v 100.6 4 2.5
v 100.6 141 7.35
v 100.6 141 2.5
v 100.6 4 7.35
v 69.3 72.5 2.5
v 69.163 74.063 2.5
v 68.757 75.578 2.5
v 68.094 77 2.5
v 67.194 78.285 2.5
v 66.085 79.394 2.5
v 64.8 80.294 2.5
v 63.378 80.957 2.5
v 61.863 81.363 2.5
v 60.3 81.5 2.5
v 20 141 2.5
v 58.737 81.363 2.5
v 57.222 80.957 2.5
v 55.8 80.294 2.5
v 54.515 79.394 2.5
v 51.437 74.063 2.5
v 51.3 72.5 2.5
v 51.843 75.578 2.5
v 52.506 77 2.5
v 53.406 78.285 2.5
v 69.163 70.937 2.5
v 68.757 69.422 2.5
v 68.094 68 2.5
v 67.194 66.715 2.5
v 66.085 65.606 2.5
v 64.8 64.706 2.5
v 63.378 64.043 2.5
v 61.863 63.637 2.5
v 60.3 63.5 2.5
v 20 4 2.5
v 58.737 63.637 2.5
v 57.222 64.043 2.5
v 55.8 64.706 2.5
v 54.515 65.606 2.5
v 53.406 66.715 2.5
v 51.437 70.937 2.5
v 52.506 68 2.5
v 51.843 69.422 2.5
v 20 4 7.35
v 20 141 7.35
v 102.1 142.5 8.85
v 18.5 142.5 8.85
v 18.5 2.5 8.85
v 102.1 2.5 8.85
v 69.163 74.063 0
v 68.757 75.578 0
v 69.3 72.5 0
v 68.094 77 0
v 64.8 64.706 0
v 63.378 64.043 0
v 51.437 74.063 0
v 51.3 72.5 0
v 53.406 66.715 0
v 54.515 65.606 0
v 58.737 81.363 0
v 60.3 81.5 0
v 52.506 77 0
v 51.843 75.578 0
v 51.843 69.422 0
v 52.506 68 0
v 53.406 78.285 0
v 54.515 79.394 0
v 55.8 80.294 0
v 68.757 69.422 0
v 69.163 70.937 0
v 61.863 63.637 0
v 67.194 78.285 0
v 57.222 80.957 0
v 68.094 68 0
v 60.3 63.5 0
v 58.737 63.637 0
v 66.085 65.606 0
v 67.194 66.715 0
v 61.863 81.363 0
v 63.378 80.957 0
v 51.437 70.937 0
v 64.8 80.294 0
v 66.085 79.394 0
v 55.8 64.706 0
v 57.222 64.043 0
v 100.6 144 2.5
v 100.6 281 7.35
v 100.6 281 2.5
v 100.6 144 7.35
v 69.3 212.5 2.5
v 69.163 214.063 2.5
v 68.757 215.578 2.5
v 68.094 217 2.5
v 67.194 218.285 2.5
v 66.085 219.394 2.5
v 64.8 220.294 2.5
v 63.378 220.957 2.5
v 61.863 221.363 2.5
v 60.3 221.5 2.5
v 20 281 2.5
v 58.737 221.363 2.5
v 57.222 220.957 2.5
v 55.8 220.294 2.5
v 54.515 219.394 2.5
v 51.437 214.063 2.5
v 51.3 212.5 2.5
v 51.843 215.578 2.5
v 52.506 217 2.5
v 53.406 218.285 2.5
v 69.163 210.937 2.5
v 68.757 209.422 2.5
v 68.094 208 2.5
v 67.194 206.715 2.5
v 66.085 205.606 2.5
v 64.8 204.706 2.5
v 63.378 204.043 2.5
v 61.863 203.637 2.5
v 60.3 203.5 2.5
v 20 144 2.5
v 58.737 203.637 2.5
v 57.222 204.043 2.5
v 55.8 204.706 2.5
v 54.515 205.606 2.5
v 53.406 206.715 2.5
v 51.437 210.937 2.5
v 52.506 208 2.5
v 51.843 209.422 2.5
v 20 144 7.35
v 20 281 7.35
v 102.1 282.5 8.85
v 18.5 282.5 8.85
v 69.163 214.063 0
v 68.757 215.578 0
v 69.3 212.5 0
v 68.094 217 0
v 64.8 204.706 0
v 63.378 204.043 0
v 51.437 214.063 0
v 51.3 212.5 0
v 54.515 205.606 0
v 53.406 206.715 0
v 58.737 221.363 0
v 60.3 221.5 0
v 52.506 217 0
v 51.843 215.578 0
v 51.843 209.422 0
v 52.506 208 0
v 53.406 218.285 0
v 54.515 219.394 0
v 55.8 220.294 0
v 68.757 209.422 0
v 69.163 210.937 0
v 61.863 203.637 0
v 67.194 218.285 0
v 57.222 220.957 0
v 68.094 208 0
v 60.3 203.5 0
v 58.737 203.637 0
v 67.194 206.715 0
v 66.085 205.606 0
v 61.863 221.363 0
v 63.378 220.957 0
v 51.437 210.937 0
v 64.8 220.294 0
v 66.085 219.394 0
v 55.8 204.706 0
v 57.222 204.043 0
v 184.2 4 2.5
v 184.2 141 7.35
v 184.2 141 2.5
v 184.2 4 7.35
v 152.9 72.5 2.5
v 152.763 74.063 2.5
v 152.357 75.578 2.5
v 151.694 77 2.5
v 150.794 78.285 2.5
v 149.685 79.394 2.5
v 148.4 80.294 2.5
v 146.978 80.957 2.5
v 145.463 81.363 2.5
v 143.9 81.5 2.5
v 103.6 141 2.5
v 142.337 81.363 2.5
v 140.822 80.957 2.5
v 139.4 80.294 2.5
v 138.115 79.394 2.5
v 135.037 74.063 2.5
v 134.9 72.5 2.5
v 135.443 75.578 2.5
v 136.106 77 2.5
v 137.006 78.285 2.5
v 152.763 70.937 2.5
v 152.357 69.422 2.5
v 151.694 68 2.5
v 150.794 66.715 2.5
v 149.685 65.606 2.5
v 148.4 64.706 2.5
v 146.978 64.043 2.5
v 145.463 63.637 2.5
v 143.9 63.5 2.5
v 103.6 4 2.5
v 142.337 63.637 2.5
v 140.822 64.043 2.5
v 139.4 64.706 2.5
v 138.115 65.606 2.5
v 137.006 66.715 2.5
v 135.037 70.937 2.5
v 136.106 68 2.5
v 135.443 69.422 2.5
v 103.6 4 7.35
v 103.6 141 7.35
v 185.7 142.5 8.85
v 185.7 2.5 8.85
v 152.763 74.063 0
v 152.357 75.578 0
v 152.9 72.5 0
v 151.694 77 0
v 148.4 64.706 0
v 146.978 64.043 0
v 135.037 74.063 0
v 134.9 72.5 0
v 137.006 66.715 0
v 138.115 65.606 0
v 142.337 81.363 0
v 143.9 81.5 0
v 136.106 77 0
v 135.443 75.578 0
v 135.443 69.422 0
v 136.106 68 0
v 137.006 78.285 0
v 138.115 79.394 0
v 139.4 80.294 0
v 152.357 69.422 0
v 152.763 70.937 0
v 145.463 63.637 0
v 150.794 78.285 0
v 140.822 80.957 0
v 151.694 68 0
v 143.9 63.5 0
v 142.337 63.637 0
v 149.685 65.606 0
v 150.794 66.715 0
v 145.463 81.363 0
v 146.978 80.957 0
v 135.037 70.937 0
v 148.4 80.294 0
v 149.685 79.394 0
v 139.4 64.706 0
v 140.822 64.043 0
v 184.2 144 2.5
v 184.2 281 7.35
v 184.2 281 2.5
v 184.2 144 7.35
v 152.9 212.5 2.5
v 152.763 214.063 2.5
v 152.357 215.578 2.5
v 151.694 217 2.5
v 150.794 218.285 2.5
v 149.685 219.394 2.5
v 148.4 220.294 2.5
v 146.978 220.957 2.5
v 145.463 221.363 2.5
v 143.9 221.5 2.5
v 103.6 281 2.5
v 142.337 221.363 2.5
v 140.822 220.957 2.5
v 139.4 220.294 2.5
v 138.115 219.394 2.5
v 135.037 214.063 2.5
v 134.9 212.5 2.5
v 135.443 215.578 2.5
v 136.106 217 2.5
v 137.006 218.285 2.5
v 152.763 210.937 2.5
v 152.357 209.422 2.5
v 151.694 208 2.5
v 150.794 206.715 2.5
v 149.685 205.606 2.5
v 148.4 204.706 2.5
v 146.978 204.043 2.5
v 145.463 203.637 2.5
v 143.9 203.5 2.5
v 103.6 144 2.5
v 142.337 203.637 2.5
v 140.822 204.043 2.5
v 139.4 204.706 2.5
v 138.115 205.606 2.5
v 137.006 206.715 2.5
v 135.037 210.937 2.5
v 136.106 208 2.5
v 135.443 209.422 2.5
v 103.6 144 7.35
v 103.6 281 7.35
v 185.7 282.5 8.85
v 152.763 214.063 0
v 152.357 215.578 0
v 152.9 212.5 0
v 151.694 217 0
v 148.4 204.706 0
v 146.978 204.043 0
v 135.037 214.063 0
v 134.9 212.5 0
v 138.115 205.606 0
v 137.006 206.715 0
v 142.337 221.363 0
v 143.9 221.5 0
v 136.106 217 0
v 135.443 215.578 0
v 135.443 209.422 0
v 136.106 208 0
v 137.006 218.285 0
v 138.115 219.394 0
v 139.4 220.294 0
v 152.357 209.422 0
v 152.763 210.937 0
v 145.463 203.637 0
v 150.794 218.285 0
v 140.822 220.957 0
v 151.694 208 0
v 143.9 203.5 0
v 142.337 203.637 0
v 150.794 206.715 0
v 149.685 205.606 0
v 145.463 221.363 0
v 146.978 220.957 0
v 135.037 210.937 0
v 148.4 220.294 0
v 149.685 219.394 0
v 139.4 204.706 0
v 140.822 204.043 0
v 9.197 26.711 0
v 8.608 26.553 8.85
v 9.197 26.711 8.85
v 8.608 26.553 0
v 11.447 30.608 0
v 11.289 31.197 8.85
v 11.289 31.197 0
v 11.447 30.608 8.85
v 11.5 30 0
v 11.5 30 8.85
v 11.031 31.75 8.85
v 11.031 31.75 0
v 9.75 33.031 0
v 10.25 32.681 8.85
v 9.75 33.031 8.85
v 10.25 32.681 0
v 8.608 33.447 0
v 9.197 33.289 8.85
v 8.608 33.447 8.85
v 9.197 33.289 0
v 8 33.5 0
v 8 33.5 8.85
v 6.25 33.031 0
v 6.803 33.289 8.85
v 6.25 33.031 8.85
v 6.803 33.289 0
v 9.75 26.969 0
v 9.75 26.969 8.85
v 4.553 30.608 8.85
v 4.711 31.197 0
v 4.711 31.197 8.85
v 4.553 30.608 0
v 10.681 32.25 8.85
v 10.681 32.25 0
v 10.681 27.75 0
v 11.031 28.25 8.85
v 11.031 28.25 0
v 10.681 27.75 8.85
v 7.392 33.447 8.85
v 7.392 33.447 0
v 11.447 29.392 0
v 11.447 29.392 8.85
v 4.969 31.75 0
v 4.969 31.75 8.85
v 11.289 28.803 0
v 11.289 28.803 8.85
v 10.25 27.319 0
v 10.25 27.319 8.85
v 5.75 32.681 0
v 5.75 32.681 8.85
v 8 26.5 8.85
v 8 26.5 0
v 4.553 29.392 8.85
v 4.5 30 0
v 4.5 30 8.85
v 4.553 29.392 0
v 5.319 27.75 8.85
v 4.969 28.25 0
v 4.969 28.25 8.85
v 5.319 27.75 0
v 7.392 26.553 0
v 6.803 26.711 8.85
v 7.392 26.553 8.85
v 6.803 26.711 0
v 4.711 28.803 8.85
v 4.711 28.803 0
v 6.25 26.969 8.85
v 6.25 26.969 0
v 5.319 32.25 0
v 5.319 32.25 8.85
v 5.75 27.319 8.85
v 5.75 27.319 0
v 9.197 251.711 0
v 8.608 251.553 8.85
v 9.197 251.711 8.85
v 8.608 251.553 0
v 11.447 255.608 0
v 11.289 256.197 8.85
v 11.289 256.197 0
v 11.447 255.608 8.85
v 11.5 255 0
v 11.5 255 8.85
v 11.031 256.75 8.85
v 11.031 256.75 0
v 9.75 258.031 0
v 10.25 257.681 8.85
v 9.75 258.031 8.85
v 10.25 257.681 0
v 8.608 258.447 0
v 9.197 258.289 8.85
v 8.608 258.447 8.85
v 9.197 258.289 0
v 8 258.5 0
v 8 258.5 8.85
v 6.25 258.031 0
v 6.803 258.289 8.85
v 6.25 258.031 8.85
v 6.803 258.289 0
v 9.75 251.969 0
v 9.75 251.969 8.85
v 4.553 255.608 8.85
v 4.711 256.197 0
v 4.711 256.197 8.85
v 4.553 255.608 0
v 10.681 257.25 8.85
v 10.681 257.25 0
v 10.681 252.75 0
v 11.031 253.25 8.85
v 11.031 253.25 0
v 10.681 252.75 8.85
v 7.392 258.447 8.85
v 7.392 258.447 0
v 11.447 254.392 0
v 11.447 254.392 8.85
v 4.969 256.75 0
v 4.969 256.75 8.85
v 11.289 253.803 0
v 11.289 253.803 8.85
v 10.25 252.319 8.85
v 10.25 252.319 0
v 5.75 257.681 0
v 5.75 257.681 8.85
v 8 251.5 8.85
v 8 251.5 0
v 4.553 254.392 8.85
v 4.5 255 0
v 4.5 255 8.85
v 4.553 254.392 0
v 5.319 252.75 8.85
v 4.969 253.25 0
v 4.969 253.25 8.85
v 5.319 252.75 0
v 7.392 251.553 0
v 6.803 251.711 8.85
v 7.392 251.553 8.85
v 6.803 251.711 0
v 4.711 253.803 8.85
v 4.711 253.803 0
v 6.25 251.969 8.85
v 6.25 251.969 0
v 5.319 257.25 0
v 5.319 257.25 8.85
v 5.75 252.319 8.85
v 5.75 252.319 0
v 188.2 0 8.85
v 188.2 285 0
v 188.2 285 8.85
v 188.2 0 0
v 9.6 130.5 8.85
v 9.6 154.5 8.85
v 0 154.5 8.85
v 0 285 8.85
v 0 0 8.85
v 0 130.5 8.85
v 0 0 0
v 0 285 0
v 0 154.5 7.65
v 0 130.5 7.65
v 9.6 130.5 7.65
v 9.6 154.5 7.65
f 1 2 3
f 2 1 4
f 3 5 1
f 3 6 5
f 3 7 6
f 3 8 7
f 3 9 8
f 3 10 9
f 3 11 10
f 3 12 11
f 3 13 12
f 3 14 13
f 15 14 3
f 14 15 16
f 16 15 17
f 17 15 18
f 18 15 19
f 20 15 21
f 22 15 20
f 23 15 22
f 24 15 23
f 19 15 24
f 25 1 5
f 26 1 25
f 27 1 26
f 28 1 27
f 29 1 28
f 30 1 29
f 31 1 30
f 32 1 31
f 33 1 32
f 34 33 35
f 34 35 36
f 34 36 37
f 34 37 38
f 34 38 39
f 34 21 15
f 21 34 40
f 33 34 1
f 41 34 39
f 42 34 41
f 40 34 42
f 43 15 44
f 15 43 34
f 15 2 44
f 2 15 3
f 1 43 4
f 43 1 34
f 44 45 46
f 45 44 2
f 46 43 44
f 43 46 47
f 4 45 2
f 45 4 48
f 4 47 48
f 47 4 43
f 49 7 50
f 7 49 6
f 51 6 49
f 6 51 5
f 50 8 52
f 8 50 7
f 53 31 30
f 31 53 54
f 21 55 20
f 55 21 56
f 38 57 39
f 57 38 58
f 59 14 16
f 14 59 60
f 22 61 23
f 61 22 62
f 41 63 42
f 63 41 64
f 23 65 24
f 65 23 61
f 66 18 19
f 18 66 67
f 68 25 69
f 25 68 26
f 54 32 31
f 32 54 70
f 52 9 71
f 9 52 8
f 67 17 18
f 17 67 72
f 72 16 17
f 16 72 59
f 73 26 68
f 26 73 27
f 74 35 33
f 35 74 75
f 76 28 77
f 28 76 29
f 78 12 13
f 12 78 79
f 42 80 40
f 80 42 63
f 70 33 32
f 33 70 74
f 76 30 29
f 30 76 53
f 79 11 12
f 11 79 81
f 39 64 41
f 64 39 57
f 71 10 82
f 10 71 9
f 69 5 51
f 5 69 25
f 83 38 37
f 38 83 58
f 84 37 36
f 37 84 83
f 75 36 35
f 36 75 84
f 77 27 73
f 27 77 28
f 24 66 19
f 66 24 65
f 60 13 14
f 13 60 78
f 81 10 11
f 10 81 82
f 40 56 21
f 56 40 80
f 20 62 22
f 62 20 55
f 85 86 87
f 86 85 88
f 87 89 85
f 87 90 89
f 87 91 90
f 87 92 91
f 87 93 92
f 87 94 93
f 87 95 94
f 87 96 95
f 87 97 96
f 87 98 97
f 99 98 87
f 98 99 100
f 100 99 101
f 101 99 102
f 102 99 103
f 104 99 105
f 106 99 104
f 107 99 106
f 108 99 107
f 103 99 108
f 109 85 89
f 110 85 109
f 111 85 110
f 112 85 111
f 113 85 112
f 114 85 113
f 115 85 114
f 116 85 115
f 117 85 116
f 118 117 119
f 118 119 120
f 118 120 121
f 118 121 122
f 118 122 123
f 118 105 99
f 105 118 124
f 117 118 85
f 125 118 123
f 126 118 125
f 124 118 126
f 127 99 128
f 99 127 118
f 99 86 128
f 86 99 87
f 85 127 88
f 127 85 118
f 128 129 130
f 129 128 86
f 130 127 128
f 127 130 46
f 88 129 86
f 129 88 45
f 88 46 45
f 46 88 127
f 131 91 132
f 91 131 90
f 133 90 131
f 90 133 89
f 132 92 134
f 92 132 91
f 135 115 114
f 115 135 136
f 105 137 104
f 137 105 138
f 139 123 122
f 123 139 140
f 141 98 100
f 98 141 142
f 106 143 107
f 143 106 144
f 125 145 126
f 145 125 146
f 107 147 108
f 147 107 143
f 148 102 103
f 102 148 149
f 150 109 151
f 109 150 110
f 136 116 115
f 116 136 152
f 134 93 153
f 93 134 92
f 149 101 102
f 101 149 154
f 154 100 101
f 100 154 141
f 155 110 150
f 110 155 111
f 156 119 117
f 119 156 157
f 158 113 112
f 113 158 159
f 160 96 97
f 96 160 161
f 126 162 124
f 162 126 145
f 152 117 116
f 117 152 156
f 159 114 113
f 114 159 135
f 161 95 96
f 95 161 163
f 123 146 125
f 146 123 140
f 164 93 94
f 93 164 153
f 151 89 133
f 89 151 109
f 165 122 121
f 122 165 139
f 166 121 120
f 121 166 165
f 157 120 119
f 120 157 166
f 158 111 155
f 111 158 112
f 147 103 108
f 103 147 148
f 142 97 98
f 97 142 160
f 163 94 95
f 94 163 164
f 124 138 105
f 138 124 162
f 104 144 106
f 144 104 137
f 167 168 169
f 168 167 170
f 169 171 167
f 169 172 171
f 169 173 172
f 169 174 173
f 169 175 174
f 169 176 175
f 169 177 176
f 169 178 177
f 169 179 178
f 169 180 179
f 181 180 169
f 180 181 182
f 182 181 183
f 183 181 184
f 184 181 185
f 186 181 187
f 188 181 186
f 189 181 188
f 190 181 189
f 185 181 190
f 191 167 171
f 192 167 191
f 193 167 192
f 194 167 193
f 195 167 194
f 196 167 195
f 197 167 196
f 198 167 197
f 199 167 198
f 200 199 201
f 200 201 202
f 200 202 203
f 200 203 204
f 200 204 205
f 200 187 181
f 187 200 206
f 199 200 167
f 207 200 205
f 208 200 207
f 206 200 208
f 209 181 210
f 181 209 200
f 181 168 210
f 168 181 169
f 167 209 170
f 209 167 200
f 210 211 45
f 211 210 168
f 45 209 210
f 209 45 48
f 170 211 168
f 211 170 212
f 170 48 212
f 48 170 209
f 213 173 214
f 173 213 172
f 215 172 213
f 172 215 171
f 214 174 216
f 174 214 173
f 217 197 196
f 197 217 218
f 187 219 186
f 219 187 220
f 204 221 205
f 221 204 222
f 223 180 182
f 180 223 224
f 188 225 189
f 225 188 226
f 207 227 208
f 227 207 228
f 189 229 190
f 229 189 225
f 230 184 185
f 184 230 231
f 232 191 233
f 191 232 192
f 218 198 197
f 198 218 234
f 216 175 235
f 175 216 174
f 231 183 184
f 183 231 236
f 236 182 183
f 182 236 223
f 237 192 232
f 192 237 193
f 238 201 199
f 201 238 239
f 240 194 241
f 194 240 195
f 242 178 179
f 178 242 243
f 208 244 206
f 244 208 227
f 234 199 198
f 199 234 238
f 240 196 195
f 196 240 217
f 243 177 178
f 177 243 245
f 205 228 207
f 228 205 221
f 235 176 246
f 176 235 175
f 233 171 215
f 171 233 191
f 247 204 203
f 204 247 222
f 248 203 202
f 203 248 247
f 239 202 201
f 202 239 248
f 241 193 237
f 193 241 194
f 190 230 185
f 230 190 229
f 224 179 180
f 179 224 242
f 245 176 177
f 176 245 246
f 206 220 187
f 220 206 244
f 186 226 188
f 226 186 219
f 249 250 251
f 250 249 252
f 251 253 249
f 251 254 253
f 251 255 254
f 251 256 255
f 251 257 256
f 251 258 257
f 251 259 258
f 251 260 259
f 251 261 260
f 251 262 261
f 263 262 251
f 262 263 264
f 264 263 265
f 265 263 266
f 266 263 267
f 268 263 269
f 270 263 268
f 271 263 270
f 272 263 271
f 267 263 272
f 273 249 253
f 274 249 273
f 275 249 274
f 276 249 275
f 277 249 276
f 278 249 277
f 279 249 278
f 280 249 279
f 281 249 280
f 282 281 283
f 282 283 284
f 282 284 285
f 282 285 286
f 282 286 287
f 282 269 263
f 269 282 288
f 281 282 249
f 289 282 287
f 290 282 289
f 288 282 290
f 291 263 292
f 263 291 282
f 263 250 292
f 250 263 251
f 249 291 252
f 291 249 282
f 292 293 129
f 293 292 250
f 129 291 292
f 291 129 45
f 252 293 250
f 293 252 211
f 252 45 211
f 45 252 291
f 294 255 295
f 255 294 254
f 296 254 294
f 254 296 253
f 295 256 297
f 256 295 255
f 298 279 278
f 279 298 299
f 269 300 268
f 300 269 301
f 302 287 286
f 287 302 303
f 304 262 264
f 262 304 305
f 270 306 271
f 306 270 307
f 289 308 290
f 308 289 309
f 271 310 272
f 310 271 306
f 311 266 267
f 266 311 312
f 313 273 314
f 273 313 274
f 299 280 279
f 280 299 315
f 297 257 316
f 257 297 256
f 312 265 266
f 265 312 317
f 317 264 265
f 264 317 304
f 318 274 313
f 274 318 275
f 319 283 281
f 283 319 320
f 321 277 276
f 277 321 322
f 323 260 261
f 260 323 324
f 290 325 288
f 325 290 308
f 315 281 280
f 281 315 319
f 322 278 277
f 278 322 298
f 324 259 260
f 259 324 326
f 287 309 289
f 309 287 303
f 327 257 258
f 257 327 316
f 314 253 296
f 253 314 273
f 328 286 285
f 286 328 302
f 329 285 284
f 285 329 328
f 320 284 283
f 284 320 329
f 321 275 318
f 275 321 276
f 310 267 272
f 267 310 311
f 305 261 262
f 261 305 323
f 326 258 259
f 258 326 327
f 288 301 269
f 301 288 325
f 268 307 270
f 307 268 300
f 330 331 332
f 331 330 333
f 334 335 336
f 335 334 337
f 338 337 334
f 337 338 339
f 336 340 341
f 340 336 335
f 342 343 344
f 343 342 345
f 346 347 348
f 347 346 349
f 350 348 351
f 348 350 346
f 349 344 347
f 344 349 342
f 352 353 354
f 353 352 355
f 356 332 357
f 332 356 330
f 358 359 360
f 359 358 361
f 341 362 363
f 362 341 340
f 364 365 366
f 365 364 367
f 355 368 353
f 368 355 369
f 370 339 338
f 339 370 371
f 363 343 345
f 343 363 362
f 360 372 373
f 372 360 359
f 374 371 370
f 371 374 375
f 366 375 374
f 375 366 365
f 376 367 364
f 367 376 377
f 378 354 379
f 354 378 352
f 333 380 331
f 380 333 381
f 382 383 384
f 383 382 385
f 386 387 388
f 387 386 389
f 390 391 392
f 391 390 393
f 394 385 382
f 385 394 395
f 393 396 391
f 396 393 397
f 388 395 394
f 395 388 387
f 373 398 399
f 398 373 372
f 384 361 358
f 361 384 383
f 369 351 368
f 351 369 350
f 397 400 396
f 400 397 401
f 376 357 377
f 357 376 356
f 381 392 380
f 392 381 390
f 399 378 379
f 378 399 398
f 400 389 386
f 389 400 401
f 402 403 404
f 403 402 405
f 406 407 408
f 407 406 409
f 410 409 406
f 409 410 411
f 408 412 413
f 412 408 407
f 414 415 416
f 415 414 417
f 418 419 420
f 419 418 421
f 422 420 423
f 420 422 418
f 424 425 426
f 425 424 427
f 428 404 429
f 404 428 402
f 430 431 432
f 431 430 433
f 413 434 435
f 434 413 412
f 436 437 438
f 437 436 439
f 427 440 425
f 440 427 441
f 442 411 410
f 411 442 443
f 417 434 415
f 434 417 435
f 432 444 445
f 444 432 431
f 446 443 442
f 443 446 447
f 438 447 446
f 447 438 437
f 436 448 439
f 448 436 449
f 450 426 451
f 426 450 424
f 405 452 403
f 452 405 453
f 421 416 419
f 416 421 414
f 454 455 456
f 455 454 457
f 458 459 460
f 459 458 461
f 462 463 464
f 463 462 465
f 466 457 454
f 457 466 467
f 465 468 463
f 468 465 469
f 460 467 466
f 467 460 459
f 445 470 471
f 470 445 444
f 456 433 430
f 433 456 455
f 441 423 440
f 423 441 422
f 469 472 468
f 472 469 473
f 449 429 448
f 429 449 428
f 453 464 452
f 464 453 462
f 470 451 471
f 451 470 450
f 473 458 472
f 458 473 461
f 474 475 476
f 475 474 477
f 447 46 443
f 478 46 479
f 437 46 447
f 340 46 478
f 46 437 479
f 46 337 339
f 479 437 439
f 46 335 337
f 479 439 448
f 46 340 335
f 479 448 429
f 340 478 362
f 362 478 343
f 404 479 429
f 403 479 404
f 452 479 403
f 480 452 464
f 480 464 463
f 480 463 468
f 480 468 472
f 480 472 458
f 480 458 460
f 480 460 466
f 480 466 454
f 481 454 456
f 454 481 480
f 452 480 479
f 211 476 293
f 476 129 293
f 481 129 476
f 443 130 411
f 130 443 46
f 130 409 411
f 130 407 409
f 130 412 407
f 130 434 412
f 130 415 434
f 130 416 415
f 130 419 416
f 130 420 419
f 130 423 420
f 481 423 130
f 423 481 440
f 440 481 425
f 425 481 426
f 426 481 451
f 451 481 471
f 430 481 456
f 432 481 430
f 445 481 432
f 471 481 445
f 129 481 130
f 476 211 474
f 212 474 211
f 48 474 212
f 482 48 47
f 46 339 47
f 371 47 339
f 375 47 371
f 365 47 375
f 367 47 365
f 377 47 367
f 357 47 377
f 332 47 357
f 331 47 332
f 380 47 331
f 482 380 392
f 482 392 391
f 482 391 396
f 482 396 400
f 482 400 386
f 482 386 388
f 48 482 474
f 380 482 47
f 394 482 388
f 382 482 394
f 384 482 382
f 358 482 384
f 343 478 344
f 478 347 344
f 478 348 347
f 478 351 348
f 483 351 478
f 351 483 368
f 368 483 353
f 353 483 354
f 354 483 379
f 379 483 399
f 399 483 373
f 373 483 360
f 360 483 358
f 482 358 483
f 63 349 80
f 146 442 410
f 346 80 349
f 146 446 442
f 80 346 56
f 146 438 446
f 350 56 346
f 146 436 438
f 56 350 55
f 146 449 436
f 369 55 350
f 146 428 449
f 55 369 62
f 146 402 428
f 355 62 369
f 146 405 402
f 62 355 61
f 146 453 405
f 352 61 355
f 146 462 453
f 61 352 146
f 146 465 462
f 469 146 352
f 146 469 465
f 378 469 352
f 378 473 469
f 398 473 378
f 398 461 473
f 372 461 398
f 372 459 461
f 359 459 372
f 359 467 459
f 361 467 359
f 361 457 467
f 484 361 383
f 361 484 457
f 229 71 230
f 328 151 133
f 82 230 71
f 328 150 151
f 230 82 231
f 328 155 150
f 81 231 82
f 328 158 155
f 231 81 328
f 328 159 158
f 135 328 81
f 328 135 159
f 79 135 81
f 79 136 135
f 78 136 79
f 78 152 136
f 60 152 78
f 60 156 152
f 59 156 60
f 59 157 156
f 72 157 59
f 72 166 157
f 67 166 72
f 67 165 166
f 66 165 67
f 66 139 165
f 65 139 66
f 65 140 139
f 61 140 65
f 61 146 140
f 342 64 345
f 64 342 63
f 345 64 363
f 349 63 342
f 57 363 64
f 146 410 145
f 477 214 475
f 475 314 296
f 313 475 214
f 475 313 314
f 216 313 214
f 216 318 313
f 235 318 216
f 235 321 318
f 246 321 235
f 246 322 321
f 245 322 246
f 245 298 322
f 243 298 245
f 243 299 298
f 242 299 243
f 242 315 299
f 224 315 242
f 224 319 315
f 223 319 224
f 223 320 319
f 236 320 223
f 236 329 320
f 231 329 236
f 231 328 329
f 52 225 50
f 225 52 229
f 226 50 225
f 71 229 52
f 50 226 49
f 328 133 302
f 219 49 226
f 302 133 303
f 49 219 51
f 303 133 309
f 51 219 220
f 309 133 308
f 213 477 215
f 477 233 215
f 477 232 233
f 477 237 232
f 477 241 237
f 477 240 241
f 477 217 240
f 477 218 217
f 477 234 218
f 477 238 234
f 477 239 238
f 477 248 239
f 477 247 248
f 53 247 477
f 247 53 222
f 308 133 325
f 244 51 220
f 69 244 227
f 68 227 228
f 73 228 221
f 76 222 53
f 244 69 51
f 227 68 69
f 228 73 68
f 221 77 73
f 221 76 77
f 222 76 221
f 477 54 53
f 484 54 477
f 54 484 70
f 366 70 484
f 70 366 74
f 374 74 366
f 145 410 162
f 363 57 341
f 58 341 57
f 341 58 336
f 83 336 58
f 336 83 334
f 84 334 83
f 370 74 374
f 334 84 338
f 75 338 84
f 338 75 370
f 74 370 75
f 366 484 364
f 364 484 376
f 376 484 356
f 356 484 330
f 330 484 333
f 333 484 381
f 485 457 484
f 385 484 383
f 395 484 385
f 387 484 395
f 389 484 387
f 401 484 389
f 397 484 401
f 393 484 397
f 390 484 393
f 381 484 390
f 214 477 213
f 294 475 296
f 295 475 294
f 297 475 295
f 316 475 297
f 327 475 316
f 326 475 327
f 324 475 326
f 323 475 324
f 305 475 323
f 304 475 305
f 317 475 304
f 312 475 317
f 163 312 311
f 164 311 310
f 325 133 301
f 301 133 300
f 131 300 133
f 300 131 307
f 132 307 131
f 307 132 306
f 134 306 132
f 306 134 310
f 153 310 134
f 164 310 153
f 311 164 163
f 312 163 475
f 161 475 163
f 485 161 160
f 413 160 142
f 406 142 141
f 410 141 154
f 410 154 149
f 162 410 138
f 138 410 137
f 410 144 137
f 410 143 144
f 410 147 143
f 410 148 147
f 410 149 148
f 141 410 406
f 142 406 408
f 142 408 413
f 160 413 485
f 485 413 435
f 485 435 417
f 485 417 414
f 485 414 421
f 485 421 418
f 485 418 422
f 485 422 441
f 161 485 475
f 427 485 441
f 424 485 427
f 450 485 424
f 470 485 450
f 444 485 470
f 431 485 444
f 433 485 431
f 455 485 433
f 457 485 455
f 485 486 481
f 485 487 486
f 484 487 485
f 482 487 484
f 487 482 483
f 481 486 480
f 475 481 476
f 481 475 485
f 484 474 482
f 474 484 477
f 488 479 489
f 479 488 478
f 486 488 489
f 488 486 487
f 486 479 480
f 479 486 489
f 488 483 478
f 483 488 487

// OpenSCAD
// pb_slab_book_v1.scad — PrimeBind PSA Slab Book
//
// Stack of 2×2 slab trays bound by Chicago screw posts on a spine rail.
// Opens like a book — 8 slabs visible at once when laid flat.
//
// Components:
//   slab_tray()    — one "page", holds 4 PSA slabs in spring-grip pockets
//   top_cover()    — front cover, logo emboss panel
//   bottom_cover() — back cover, flat
//
// Hardware: 2× Chicago screw posts, 6mm shaft diameter
//           Stack posts or use longer posts to match tray count.
//           Available at craft/office stores or Amazon.
//
// Print:    Matte PLA | flat on bed | no supports | 2+ perimeter walls
// Minitest: scale to 33% in Creality Print before committing full tray
//
// MEASURE YOUR SLABS before printing — PSA dimensions vary by card size.
// Update SLAB_W / SLAB_H / SLAB_T below.

// ── Slab dimensions ──────────────────────────────────────────────────────────
// PSA standard holder (modern trading cards — 3.19″ × 5.38″ × 0.25″)
SLAB_W = 81.0;    // 3.19″ — holder width
SLAB_H = 136.5;   // 5.38″ — holder height
SLAB_T = 6.35;    // 0.25″ — holder thickness

// ── Pocket fit ───────────────────────────────────────────────────────────────
// Width:  undersize by 0.4mm total (0.2mm per side) → spring grip in X
// Height: oversize by 0.5mm total → easy drop-in insertion
// Depth:  exact slab thickness → slab sits flush, tray above acts as lid
FIT_W = SLAB_W - 0.4;   // 80.6mm
FIT_H = SLAB_H + 0.5;   // 137.0mm
FIT_D = SLAB_T;          // 6.35mm

ENTRY_C = 1.5;   // chamfer at pocket opening to guide slab past spring zone

// ── Layout ───────────────────────────────────────────────────────────────────
COLS = 2;
ROWS = 2;

// ── Structure ─────────────────────────────────────────────────────────────────
SPINE_W  = 16.0;   // spine rail — post holes centered here
WALL_O   = 4.0;    // outer walls (right, top, bottom edges)
WALL_I   = 3.0;    // wall between adjacent pockets
BASE_T   = 2.5;    // tray floor — thick enough to resist flex
COVER_T  = 5.0;    // cover plate thickness

// ── Binding posts ─────────────────────────────────────────────────────────────
POST_HOLE_D = 7.0;    // 6mm Chicago screw shaft + 0.5mm clearance per side
POST_INSET  = 30.0;   // distance from top/bottom tray edge to post hole center

// ── Thumb-push holes ──────────────────────────────────────────────────────────
PUSH_D = 18.0;    // hole in pocket floor; push slab up from below to release

// ── Derived dimensions ────────────────────────────────────────────────────────
TW = SPINE_W + WALL_O + FIT_W*COLS + WALL_I*(COLS-1) + WALL_O;
TH = WALL_O  + FIT_H*ROWS + WALL_I*(ROWS-1) + WALL_O;
TD = BASE_T  + FIT_D;

// X origin of first pocket column (right of spine)
PKX = SPINE_W + WALL_O;

echo("─────────────────────────────────");
echo("Tray footprint:", TW, "×", TH, "mm");
echo("Tray depth:", TD, "mm");
echo("Pocket fit W:", FIT_W, "H:", FIT_H, "D:", FIT_D);
echo("─────────────────────────────────");


// ── Helpers ───────────────────────────────────────────────────────────────────

module post_holes(depth) {
    for (y = [POST_INSET, TH - POST_INSET])
        translate([SPINE_W/2, y, -0.1])
            cylinder(h=depth + 0.2, d=POST_HOLE_D, $fn=36);
}

module pocket_cut() {
    // Main pocket volume — spring walls grip slab in X
    translate([0, 0, BASE_T])
        cube([FIT_W, FIT_H, FIT_D + 0.1]);

    // Entry chamfer at top opening — wider funnel that narrows to FIT_W
    // Slab slides through chamfer zone, then gripped by interference walls below
    translate([0, 0, BASE_T + FIT_D - ENTRY_C])
        hull() {
            cube([FIT_W, FIT_H, 0.01]);
            translate([-ENTRY_C, -ENTRY_C, ENTRY_C])
                cube([FIT_W + ENTRY_C*2, FIT_H + ENTRY_C*2, 0.01]);
        }

    // Thumb-push hole through floor — center of pocket
    translate([FIT_W/2, FIT_H/2, -0.1])
        cylinder(h=BASE_T + 0.2, d=PUSH_D, $fn=36);
}


// ── Slab Tray ─────────────────────────────────────────────────────────────────
module slab_tray() {
    difference() {
        cube([TW, TH, TD]);

        // pockets — 2 columns × 2 rows
        for (c = [0:COLS-1], r = [0:ROWS-1])
            translate([
                PKX + c*(FIT_W + WALL_I),
                WALL_O + r*(FIT_H + WALL_I),
                0
            ])
            pocket_cut();

        // binding post holes through spine rail
        post_holes(TD);

        // spine slot: shallow channel on spine face for finger grip when flipping
        translate([-0.1, TH/2 - 12, TD - 1.2])
            cube([SPINE_W * 0.6 + 0.1, 24, 1.3]);
    }
}


// ── Top Cover ─────────────────────────────────────────────────────────────────
// Front cover when book is closed (faces outward).
// Logo emboss panel: a 0.8mm sunken rectangle — drop PrimeBind logo SVG here.
module top_cover() {
    difference() {
        cube([TW, TH, COVER_T]);

        post_holes(COVER_T);

        // Logo emboss panel (right of spine, centered vertically)
        translate([SPINE_W + 8, TH * 0.3, COVER_T - 0.8])
            cube([TW - SPINE_W - 16, TH * 0.4, 0.9]);
    }
}


// ── Bottom Cover ──────────────────────────────────────────────────────────────
module bottom_cover() {
    difference() {
        cube([TW, TH, COVER_T]);
        post_holes(COVER_T);
    }
}


// ── Render ────────────────────────────────────────────────────────────────────
// Uncomment one part at a time → export STL → print

slab_tray();

// translate([TW + 20, 0, 0]) top_cover();
// translate([TW*2 + 40, 0, 0]) bottom_cover();

// All parts flat for overview:
// slab_tray();
// translate([0, TH + 15, 0]) slab_tray();   // second page
// translate([TW + 20, 0, 0]) top_cover();
// translate([TW + 20, TH + 15, 0]) bottom_cover();
